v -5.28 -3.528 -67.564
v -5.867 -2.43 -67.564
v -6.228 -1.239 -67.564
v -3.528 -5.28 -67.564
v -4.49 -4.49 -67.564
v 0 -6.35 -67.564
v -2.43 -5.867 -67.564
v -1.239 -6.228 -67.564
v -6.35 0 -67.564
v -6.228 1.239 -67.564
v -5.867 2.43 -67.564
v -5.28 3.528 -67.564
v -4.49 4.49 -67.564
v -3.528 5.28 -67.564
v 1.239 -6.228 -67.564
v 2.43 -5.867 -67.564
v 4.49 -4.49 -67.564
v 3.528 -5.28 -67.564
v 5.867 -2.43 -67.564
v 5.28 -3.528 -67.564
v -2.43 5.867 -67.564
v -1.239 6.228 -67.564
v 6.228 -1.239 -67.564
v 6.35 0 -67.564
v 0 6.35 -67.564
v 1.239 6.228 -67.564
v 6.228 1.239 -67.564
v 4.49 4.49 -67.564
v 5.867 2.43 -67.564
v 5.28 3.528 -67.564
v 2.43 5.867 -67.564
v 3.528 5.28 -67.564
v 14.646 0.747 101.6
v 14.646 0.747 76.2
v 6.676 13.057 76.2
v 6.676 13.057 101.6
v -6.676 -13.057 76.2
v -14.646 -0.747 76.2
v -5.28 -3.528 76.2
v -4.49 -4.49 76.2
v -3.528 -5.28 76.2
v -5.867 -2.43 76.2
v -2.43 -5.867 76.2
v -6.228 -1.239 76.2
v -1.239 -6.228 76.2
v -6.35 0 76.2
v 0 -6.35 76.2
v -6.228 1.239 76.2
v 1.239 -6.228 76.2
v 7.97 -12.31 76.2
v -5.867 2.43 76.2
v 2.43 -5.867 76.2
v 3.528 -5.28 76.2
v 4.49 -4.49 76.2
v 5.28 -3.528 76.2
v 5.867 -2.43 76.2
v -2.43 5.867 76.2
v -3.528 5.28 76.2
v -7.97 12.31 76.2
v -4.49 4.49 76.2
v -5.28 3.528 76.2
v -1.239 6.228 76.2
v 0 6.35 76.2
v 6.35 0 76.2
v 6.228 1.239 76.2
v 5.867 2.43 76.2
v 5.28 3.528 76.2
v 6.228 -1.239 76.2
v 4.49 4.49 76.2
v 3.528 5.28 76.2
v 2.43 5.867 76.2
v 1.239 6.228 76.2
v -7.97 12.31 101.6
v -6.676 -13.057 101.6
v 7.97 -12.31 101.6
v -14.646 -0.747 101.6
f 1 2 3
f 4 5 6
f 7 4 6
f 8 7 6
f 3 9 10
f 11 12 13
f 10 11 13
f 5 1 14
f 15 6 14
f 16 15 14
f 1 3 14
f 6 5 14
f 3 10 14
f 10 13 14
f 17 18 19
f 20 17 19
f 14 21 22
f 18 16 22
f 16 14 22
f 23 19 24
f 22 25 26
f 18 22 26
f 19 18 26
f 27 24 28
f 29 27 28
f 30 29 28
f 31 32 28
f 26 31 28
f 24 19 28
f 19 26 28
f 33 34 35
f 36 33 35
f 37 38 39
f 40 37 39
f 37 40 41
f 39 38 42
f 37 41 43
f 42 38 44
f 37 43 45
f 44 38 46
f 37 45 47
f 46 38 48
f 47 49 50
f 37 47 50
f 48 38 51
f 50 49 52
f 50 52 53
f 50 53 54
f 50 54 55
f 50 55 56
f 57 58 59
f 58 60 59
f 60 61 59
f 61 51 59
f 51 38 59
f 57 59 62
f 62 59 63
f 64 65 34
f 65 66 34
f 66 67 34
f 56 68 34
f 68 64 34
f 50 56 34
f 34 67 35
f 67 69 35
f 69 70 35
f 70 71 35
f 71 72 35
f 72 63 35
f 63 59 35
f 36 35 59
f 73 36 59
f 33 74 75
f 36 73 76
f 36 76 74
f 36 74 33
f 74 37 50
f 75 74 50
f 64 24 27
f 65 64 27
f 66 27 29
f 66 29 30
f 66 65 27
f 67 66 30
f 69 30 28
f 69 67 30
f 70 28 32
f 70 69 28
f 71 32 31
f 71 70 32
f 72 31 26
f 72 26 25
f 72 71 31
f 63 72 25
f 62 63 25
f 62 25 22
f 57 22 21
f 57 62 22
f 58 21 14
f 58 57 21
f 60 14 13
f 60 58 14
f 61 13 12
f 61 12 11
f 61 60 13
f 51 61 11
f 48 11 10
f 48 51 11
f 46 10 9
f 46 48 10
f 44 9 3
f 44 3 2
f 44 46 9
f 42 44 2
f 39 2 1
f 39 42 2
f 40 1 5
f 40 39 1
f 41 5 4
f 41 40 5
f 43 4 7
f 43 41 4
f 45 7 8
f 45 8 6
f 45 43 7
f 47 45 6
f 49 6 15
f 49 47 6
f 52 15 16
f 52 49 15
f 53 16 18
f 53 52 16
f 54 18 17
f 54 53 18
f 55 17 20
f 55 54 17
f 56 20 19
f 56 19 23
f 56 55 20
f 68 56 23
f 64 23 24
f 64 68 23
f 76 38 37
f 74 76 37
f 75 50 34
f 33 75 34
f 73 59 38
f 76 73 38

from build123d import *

# Parameters (mm, degrees)
F0_R     = 6.35
F1_DEPTH = 76.2
F2_DEPTH = 67.564
F4_DEPTH = 25.4


with BuildPart() as f1:
    # F0 (on Top) → F1 (new body)
    with BuildSketch(Plane.XY):
        Circle(F0_R)
    extrude(amount=F1_DEPTH)

    # F0 (on Top) → F2 (join)
    with BuildSketch(Plane.XY):
        Circle(F0_R)
    extrude(amount=-F2_DEPTH)

    # F3 (on face) → F4 (join)
    with BuildSketch(Plane.XY.offset(76.2)):
        Polygon((14.64565, 0.747176), (6.675751, 13.057093), (-7.969899, 12.309917), (-14.64565, -0.747176), (-6.675751, -13.057093), (7.969899, -12.309917), align=None)
    extrude(amount=F4_DEPTH)


solid = f1.part
